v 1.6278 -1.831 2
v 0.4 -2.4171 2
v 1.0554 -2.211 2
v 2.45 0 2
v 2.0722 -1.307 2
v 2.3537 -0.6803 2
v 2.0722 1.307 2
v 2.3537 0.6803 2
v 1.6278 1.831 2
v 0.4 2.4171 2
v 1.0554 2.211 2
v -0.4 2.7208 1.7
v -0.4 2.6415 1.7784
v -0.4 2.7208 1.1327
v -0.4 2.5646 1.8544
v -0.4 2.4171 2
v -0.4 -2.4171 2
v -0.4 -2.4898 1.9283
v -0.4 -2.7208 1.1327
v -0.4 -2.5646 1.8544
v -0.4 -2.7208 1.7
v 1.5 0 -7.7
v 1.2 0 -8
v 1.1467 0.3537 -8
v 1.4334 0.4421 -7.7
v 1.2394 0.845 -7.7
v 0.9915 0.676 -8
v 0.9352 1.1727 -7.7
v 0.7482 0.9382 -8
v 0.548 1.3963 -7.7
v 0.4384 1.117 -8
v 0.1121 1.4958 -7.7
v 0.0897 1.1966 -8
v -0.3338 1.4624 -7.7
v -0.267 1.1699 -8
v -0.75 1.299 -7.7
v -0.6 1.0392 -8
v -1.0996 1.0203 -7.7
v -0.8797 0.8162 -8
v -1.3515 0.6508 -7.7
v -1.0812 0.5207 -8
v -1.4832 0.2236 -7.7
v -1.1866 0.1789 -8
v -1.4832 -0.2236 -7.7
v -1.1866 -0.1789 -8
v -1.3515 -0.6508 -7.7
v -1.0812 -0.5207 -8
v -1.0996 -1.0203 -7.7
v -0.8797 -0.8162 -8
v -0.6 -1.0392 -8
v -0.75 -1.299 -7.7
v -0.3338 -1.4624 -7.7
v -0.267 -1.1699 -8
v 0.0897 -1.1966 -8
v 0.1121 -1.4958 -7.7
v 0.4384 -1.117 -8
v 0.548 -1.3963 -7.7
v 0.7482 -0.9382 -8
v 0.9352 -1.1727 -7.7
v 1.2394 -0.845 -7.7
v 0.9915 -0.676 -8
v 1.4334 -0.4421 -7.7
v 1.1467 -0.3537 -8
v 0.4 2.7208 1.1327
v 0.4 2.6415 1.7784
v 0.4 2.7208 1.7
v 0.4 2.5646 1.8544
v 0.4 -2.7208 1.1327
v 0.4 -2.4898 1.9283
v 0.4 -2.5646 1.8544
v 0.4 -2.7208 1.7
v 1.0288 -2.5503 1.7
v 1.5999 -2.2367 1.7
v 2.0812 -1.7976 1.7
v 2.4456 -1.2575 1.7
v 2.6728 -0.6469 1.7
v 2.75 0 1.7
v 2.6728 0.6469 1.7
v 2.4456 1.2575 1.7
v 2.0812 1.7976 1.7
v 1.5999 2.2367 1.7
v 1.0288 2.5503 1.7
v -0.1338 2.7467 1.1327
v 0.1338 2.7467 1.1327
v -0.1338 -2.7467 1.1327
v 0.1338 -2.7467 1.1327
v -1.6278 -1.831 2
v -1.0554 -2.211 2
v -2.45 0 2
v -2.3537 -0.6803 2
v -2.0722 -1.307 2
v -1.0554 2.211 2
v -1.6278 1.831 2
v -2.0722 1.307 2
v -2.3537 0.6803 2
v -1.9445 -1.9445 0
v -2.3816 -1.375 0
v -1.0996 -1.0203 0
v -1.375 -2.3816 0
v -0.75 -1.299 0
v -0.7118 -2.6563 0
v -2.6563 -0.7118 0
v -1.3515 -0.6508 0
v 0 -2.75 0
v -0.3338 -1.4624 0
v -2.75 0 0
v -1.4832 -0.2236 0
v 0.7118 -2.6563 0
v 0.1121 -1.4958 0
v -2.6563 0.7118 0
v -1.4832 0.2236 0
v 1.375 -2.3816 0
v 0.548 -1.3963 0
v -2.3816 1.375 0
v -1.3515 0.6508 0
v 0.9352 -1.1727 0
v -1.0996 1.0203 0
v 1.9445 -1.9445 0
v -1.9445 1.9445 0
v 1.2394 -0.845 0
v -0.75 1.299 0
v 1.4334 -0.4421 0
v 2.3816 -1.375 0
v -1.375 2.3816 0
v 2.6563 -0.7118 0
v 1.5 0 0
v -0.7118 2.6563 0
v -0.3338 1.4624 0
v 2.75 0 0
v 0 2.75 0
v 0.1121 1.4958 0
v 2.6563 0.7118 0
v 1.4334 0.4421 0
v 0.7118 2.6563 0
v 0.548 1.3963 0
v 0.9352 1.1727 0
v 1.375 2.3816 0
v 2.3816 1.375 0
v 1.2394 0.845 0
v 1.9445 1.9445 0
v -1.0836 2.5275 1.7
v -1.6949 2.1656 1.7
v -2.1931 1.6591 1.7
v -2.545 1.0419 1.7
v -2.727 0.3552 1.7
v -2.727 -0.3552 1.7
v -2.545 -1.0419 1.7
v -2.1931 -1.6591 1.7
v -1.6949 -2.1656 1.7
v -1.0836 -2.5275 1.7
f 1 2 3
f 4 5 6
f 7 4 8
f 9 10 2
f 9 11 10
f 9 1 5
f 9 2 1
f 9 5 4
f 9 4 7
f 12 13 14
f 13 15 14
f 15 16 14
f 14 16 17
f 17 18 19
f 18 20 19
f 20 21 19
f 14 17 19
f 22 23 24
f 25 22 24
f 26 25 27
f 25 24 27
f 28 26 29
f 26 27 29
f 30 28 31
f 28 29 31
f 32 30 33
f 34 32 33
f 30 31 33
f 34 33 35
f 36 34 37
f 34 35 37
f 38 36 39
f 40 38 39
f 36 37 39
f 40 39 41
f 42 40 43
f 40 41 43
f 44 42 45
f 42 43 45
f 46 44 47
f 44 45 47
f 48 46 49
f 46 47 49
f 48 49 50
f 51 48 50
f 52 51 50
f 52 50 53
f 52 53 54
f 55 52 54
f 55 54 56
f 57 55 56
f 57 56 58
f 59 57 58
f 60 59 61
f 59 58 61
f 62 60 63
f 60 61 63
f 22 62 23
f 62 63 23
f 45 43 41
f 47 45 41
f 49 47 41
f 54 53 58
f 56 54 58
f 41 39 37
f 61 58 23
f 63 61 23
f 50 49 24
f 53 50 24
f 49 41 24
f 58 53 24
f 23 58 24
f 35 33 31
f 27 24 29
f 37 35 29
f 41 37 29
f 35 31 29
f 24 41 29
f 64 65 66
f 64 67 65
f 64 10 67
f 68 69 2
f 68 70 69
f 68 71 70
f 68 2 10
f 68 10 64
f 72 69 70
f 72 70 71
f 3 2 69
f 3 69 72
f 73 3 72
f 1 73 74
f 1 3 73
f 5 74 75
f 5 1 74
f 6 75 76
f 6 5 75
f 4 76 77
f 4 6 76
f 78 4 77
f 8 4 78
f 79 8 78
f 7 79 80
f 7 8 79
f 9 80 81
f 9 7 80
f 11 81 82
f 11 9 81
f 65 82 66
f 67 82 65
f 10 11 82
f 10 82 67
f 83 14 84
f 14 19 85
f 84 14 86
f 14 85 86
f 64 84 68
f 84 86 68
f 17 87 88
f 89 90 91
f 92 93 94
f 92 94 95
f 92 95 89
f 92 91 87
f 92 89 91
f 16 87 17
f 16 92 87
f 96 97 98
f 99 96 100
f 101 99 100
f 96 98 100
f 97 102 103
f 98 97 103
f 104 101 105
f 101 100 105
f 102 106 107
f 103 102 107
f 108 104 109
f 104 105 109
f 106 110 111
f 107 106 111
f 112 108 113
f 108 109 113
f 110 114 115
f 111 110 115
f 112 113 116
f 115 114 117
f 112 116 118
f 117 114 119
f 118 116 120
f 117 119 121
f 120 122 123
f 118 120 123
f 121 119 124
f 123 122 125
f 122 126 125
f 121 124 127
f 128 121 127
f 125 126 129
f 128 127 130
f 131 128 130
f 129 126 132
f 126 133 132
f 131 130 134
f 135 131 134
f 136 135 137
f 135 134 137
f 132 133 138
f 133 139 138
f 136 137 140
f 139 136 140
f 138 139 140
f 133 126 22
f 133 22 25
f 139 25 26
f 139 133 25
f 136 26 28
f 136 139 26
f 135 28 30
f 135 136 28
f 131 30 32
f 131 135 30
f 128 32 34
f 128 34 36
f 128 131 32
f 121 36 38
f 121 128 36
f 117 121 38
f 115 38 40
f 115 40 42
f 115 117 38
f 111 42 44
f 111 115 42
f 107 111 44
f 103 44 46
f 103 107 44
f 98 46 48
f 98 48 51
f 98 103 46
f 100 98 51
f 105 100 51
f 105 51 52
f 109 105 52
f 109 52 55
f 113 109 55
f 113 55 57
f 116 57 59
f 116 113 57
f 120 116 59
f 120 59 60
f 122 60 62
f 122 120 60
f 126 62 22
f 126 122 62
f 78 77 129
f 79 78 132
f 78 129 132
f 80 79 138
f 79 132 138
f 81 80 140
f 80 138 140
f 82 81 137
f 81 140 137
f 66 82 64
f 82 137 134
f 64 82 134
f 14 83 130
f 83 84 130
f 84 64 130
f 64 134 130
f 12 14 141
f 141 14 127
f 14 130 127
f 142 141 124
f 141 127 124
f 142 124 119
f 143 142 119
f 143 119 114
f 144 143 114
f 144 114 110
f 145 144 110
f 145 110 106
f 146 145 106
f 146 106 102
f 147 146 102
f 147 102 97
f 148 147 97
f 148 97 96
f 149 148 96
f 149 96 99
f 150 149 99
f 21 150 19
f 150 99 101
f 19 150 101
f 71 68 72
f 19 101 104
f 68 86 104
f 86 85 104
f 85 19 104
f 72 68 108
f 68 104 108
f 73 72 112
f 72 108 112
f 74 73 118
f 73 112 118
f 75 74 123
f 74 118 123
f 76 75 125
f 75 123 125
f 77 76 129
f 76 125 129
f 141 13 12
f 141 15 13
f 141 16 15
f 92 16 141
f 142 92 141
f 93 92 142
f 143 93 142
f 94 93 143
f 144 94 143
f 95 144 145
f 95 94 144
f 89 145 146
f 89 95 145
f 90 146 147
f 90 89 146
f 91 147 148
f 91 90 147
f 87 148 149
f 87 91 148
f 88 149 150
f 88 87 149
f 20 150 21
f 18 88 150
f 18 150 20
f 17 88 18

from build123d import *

# Parameters (mm, degrees)
SKETCH1_R               = 1.5
BOSS_EXTRUDE1_DEPTH     = 8
SKETCH2_R               = 2.75
BOSS_EXTRUDE2_DEPTH     = 2
CHAMFER1_SIZE           = 0.3
CUT_EXTRUDE1_DEPTH      = 9.895223437
CUT_EXTRUDE1_DEPTH_BACK = 9.895223437
SKETCH3_W               = 0.8
SKETCH3_H               = 1.7


with BuildPart() as part:
    # Sketch1 → Boss-Extrude1 (new body)
    with BuildSketch(Plane.XY):
        Circle(SKETCH1_R)
    extrude(amount=-BOSS_EXTRUDE1_DEPTH)

    # Sketch2 → Boss-Extrude2 (add)
    with BuildSketch(Plane.XY):
        Circle(SKETCH2_R)
    extrude(amount=BOSS_EXTRUDE2_DEPTH)

    # Chamfer1
    chamfer1_edges = [part.edges().sort_by_distance(p)[0] for p in [
        (-1.5, 0, -8),
        (-2.75, 0, 2),
    ]]
    chamfer(chamfer1_edges, length=CHAMFER1_SIZE)

    # Sketch3 → Cut-Extrude1 (cut, two sides: drawn at the far end of the back side and taken through both)
    with BuildSketch(Plane(origin=(0, 0, 0), x_dir=(1, 0, 0), z_dir=(0, 1, 0)).offset(-CUT_EXTRUDE1_DEPTH_BACK)):
        with Locations((0, -1.982738086)):
            Rectangle(SKETCH3_W, SKETCH3_H)
    extrude(amount=CUT_EXTRUDE1_DEPTH + CUT_EXTRUDE1_DEPTH_BACK, mode=Mode.SUBTRACT)


solid = part.part
